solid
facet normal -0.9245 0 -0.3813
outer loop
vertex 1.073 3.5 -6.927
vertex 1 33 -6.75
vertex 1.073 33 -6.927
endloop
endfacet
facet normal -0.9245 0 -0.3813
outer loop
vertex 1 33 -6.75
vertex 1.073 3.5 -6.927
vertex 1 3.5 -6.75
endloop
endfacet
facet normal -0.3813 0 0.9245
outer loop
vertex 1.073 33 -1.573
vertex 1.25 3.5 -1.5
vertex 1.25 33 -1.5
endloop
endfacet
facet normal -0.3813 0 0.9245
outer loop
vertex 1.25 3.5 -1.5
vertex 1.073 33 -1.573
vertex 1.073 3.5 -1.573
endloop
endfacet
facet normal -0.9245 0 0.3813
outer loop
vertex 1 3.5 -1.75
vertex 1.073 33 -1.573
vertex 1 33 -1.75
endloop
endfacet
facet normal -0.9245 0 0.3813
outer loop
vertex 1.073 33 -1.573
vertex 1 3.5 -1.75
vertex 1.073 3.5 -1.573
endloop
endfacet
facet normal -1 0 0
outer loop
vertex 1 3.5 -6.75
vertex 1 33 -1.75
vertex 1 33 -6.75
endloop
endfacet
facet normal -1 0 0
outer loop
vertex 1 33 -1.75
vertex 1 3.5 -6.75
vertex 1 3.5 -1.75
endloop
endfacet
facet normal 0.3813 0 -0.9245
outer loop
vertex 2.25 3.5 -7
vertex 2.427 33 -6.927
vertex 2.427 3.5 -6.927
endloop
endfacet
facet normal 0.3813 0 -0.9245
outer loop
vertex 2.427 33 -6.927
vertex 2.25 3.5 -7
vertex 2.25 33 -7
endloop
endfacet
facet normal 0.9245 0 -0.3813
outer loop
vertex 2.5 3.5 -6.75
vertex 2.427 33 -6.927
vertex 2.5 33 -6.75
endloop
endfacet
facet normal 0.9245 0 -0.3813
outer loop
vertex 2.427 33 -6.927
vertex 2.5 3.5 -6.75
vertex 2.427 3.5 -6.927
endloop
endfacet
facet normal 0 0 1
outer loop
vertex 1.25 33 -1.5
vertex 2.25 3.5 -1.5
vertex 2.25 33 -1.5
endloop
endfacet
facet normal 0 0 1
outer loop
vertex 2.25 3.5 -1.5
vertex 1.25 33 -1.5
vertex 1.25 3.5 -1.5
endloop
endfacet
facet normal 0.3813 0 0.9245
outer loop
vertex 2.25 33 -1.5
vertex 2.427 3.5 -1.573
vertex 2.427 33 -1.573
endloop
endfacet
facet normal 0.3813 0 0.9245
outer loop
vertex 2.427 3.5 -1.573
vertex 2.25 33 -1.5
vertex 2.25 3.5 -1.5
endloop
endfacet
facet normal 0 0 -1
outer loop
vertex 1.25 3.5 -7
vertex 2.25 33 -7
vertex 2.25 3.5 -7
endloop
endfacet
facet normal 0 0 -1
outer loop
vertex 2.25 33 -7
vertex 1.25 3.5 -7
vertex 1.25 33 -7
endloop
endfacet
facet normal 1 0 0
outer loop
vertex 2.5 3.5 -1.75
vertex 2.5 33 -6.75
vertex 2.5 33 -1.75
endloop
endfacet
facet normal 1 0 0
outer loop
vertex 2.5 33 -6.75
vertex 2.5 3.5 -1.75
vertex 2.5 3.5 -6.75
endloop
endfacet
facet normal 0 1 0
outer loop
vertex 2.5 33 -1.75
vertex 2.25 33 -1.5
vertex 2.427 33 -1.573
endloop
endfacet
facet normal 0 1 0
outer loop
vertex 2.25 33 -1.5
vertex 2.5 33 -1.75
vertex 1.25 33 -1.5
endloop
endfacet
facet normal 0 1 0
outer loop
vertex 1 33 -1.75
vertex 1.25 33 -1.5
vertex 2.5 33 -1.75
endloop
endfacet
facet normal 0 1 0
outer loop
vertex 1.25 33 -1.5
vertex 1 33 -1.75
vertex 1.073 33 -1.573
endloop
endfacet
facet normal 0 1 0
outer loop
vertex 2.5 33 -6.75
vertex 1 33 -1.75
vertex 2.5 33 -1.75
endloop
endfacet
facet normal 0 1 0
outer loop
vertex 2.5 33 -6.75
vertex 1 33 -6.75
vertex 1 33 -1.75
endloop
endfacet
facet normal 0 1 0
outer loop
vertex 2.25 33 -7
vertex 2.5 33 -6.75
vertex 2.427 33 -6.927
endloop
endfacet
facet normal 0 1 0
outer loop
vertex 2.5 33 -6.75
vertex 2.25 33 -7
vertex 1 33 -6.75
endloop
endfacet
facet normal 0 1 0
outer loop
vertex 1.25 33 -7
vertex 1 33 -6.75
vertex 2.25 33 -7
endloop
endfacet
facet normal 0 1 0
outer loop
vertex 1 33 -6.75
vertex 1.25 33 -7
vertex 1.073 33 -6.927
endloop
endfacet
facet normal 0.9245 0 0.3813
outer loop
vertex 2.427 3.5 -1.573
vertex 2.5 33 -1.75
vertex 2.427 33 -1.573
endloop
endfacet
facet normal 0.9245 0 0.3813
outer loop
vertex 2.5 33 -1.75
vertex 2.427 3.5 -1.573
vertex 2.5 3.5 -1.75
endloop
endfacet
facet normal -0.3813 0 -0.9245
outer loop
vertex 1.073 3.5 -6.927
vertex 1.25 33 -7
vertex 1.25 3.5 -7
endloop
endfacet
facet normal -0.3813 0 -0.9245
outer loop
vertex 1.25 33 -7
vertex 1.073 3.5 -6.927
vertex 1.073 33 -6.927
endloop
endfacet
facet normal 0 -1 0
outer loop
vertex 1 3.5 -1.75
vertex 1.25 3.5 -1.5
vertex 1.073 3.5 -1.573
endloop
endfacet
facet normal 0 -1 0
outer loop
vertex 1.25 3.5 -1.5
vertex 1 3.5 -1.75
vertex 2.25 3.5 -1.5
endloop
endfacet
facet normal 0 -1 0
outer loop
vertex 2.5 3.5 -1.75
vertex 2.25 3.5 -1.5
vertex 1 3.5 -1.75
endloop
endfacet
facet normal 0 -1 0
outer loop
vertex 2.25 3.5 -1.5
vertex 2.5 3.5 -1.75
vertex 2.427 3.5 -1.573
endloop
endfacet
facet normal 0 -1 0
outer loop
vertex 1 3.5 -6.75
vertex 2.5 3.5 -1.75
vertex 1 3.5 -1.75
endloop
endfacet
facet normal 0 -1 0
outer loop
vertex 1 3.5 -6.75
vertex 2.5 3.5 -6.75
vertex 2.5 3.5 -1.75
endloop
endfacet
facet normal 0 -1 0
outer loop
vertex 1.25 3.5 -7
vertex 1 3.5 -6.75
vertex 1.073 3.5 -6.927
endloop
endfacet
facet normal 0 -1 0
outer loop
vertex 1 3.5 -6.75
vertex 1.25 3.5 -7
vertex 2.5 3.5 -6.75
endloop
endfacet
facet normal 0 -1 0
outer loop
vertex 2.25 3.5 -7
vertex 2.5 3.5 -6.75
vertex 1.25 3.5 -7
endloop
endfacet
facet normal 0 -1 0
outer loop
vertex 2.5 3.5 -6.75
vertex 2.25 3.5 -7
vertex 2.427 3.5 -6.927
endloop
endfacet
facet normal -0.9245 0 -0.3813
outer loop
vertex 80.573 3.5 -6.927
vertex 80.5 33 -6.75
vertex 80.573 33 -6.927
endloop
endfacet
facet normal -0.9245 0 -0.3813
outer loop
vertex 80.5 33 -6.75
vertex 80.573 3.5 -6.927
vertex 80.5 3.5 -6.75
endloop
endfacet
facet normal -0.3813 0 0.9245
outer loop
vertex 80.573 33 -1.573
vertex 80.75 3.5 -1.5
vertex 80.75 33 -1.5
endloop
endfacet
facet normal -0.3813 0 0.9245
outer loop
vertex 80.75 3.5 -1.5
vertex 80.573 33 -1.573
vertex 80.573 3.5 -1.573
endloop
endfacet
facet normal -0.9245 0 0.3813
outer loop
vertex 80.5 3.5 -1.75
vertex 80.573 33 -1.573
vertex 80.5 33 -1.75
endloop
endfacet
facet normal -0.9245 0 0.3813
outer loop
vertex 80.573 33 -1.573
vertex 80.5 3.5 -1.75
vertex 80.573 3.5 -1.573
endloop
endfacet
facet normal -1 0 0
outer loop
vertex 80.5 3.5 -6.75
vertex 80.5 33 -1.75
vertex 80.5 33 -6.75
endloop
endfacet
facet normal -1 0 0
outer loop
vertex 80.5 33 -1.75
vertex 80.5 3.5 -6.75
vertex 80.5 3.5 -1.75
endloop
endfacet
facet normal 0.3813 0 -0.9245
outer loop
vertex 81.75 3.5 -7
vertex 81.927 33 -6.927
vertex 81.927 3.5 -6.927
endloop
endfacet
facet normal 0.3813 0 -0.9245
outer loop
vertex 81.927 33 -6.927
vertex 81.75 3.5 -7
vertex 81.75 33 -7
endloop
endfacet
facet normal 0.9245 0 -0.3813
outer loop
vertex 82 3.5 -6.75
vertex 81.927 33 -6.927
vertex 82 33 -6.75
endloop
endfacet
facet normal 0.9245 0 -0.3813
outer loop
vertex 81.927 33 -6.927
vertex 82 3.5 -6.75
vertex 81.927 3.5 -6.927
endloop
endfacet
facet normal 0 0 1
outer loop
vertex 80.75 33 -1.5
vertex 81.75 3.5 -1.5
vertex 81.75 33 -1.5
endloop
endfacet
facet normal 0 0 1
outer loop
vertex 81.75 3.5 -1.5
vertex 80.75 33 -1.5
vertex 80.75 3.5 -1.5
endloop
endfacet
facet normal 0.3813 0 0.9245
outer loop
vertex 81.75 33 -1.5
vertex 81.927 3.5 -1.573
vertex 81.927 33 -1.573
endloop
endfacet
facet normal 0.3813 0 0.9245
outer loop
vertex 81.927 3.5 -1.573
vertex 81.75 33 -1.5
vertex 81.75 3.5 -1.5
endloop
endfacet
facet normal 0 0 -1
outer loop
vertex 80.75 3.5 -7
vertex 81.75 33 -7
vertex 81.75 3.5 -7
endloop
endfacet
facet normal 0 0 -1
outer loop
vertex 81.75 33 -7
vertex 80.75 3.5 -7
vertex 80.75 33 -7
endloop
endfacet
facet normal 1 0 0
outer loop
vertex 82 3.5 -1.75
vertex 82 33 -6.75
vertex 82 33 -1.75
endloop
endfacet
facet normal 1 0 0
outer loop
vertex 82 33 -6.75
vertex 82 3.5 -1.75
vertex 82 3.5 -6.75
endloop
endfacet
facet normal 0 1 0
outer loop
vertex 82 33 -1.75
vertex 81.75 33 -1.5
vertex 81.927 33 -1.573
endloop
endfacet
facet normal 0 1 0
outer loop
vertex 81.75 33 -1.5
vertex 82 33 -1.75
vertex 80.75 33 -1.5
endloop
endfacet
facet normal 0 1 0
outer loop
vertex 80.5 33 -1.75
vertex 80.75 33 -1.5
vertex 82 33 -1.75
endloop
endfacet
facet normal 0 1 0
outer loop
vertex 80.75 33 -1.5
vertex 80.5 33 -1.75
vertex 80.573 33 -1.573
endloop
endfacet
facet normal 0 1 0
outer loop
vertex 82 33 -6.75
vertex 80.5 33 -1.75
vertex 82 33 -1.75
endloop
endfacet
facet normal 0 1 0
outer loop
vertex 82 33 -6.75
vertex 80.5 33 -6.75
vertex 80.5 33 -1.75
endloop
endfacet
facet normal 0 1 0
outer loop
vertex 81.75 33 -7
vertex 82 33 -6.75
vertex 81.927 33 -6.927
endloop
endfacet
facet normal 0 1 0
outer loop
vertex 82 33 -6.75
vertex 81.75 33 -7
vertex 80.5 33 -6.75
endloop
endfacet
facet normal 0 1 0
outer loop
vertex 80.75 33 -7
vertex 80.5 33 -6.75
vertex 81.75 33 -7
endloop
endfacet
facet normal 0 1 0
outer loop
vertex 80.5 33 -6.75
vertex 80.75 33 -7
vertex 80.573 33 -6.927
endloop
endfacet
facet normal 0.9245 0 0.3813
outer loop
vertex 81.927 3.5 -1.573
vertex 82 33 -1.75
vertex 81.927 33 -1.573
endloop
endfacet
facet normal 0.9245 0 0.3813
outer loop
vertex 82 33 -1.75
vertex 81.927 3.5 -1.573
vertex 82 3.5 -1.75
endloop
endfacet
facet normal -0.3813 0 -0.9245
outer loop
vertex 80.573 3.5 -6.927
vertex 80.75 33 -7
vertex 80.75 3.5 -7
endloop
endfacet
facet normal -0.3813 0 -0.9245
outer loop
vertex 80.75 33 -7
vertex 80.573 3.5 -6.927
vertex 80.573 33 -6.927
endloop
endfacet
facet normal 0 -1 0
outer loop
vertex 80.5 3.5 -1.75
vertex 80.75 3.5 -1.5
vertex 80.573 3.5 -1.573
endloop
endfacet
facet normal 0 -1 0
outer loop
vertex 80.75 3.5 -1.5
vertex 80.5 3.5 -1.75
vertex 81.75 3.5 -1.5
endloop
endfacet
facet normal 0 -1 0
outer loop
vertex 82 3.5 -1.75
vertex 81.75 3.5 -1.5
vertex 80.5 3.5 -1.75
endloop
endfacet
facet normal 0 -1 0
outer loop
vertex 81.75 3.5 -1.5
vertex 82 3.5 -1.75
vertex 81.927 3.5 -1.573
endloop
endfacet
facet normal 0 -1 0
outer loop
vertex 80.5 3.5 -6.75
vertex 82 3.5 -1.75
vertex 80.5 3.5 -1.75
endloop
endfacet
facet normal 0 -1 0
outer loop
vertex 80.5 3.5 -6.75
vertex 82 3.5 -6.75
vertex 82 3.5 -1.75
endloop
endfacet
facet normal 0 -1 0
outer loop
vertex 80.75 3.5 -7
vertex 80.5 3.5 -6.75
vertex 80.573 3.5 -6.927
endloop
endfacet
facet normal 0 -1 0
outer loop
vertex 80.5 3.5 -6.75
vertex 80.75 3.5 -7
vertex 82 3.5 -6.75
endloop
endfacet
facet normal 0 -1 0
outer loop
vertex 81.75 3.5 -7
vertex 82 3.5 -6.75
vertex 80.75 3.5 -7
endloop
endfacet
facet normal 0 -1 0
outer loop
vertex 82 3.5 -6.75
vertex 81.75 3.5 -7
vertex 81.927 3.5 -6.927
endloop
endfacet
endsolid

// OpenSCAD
// file: lumber.scad
TWO_BY = 1.5;
SIX_BY = 5.5;
FOUR_BY = 3.5;

module rounded_box(points, radius, height){
    hull(){
        for (p = points){
            translate(p) cylinder(r=radius, h=height);
        }
    }
}

module board(x = 0, y = 0, z = 0) {
  radius = 0.25;
  points = [
    [0 + radius, 0 + radius, 0],
    [x - radius, 0 + radius, 0],
    [0 + radius, y - radius, 0],
    [x - radius, y - radius, 0]
  ];
  rounded_box(points, radius, z);
}

module two_by_six(length = 0) {
  board(SIX_BY, TWO_BY, length);
}

module four_by_four(length = 0) {
  board(FOUR_BY, FOUR_BY, length);
}
// file: leg.scad
include <lumber.scad>

module leg(length) {
  four_by_four(length);
}

module bib(table_width, table_length, leg_offset) {
  half_bib_thickness = TWO_BY / 2;
  half_leg_thickness = FOUR_BY / 2;
  short_side_length = table_width - (2 * FOUR_BY) - 2;

  short_sides_translations = [
    [leg_offset + (half_leg_thickness + half_bib_thickness),   leg_offset + FOUR_BY, -TWO_BY],
    [table_length - (half_leg_thickness - half_bib_thickness), leg_offset + FOUR_BY, -TWO_BY]
  ];

  for (translation = short_sides_translations) {
    translate(translation)
    rotate([0, 90, 90])
      two_by_six(short_side_length);
  }
}

module legs(table_width, table_length, table_height, leg_offset) {
  leg_length = table_height - TWO_BY;
  vertical_offset = -1 * (leg_length + TWO_BY);

  leg_translations = [
    [leg_offset,                          leg_offset,                         vertical_offset],
    [leg_offset,                          table_width - FOUR_BY - leg_offset, vertical_offset],
    [table_length - FOUR_BY - leg_offset, leg_offset,                         vertical_offset],
    [table_length - FOUR_BY - leg_offset, table_width - FOUR_BY - leg_offset, vertical_offset]
  ];

  for (translation = leg_translations) {
    translate(translation)
      leg(leg_length);
  }
}
// file: table_top.scad
include <lumber.scad>

module table_top(width, length) {
  rotate([-90])
    two_by_six(width);
  rotate([-90])
  translate([length - SIX_BY, 0, 0])
    two_by_six(width);

  width_remainder = width % SIX_BY;
  suggestedWidthLow = width - width_remainder;
  suggestedWidthHigh = width + (SIX_BY - width_remainder);
  assert(width_remainder == 0, str("ERROR: Table width (", table_width, ") isn't an even multiple of board width, Did you mean ", suggestedWidthLow, " or ", suggestedWidthHigh));

  board_count = floor(width / SIX_BY);

  for (i=[1:1:board_count]) {
    rotate([-90, 0, -90])
    translate([-SIX_BY * i, 0, SIX_BY])
      two_by_six(length - (SIX_BY * 2));
  }
}
// main file
include <table_top.scad>
include <leg.scad>
$fa = 1;
$fs = 0.2;

table_height = 30;
table_width = 38.5;
table_length = 83;
leg_offset = 0;

%table_top(width = table_width, length = table_length);
%legs(table_width, table_length, table_height, leg_offset);
bib(table_width, table_length, leg_offset);
